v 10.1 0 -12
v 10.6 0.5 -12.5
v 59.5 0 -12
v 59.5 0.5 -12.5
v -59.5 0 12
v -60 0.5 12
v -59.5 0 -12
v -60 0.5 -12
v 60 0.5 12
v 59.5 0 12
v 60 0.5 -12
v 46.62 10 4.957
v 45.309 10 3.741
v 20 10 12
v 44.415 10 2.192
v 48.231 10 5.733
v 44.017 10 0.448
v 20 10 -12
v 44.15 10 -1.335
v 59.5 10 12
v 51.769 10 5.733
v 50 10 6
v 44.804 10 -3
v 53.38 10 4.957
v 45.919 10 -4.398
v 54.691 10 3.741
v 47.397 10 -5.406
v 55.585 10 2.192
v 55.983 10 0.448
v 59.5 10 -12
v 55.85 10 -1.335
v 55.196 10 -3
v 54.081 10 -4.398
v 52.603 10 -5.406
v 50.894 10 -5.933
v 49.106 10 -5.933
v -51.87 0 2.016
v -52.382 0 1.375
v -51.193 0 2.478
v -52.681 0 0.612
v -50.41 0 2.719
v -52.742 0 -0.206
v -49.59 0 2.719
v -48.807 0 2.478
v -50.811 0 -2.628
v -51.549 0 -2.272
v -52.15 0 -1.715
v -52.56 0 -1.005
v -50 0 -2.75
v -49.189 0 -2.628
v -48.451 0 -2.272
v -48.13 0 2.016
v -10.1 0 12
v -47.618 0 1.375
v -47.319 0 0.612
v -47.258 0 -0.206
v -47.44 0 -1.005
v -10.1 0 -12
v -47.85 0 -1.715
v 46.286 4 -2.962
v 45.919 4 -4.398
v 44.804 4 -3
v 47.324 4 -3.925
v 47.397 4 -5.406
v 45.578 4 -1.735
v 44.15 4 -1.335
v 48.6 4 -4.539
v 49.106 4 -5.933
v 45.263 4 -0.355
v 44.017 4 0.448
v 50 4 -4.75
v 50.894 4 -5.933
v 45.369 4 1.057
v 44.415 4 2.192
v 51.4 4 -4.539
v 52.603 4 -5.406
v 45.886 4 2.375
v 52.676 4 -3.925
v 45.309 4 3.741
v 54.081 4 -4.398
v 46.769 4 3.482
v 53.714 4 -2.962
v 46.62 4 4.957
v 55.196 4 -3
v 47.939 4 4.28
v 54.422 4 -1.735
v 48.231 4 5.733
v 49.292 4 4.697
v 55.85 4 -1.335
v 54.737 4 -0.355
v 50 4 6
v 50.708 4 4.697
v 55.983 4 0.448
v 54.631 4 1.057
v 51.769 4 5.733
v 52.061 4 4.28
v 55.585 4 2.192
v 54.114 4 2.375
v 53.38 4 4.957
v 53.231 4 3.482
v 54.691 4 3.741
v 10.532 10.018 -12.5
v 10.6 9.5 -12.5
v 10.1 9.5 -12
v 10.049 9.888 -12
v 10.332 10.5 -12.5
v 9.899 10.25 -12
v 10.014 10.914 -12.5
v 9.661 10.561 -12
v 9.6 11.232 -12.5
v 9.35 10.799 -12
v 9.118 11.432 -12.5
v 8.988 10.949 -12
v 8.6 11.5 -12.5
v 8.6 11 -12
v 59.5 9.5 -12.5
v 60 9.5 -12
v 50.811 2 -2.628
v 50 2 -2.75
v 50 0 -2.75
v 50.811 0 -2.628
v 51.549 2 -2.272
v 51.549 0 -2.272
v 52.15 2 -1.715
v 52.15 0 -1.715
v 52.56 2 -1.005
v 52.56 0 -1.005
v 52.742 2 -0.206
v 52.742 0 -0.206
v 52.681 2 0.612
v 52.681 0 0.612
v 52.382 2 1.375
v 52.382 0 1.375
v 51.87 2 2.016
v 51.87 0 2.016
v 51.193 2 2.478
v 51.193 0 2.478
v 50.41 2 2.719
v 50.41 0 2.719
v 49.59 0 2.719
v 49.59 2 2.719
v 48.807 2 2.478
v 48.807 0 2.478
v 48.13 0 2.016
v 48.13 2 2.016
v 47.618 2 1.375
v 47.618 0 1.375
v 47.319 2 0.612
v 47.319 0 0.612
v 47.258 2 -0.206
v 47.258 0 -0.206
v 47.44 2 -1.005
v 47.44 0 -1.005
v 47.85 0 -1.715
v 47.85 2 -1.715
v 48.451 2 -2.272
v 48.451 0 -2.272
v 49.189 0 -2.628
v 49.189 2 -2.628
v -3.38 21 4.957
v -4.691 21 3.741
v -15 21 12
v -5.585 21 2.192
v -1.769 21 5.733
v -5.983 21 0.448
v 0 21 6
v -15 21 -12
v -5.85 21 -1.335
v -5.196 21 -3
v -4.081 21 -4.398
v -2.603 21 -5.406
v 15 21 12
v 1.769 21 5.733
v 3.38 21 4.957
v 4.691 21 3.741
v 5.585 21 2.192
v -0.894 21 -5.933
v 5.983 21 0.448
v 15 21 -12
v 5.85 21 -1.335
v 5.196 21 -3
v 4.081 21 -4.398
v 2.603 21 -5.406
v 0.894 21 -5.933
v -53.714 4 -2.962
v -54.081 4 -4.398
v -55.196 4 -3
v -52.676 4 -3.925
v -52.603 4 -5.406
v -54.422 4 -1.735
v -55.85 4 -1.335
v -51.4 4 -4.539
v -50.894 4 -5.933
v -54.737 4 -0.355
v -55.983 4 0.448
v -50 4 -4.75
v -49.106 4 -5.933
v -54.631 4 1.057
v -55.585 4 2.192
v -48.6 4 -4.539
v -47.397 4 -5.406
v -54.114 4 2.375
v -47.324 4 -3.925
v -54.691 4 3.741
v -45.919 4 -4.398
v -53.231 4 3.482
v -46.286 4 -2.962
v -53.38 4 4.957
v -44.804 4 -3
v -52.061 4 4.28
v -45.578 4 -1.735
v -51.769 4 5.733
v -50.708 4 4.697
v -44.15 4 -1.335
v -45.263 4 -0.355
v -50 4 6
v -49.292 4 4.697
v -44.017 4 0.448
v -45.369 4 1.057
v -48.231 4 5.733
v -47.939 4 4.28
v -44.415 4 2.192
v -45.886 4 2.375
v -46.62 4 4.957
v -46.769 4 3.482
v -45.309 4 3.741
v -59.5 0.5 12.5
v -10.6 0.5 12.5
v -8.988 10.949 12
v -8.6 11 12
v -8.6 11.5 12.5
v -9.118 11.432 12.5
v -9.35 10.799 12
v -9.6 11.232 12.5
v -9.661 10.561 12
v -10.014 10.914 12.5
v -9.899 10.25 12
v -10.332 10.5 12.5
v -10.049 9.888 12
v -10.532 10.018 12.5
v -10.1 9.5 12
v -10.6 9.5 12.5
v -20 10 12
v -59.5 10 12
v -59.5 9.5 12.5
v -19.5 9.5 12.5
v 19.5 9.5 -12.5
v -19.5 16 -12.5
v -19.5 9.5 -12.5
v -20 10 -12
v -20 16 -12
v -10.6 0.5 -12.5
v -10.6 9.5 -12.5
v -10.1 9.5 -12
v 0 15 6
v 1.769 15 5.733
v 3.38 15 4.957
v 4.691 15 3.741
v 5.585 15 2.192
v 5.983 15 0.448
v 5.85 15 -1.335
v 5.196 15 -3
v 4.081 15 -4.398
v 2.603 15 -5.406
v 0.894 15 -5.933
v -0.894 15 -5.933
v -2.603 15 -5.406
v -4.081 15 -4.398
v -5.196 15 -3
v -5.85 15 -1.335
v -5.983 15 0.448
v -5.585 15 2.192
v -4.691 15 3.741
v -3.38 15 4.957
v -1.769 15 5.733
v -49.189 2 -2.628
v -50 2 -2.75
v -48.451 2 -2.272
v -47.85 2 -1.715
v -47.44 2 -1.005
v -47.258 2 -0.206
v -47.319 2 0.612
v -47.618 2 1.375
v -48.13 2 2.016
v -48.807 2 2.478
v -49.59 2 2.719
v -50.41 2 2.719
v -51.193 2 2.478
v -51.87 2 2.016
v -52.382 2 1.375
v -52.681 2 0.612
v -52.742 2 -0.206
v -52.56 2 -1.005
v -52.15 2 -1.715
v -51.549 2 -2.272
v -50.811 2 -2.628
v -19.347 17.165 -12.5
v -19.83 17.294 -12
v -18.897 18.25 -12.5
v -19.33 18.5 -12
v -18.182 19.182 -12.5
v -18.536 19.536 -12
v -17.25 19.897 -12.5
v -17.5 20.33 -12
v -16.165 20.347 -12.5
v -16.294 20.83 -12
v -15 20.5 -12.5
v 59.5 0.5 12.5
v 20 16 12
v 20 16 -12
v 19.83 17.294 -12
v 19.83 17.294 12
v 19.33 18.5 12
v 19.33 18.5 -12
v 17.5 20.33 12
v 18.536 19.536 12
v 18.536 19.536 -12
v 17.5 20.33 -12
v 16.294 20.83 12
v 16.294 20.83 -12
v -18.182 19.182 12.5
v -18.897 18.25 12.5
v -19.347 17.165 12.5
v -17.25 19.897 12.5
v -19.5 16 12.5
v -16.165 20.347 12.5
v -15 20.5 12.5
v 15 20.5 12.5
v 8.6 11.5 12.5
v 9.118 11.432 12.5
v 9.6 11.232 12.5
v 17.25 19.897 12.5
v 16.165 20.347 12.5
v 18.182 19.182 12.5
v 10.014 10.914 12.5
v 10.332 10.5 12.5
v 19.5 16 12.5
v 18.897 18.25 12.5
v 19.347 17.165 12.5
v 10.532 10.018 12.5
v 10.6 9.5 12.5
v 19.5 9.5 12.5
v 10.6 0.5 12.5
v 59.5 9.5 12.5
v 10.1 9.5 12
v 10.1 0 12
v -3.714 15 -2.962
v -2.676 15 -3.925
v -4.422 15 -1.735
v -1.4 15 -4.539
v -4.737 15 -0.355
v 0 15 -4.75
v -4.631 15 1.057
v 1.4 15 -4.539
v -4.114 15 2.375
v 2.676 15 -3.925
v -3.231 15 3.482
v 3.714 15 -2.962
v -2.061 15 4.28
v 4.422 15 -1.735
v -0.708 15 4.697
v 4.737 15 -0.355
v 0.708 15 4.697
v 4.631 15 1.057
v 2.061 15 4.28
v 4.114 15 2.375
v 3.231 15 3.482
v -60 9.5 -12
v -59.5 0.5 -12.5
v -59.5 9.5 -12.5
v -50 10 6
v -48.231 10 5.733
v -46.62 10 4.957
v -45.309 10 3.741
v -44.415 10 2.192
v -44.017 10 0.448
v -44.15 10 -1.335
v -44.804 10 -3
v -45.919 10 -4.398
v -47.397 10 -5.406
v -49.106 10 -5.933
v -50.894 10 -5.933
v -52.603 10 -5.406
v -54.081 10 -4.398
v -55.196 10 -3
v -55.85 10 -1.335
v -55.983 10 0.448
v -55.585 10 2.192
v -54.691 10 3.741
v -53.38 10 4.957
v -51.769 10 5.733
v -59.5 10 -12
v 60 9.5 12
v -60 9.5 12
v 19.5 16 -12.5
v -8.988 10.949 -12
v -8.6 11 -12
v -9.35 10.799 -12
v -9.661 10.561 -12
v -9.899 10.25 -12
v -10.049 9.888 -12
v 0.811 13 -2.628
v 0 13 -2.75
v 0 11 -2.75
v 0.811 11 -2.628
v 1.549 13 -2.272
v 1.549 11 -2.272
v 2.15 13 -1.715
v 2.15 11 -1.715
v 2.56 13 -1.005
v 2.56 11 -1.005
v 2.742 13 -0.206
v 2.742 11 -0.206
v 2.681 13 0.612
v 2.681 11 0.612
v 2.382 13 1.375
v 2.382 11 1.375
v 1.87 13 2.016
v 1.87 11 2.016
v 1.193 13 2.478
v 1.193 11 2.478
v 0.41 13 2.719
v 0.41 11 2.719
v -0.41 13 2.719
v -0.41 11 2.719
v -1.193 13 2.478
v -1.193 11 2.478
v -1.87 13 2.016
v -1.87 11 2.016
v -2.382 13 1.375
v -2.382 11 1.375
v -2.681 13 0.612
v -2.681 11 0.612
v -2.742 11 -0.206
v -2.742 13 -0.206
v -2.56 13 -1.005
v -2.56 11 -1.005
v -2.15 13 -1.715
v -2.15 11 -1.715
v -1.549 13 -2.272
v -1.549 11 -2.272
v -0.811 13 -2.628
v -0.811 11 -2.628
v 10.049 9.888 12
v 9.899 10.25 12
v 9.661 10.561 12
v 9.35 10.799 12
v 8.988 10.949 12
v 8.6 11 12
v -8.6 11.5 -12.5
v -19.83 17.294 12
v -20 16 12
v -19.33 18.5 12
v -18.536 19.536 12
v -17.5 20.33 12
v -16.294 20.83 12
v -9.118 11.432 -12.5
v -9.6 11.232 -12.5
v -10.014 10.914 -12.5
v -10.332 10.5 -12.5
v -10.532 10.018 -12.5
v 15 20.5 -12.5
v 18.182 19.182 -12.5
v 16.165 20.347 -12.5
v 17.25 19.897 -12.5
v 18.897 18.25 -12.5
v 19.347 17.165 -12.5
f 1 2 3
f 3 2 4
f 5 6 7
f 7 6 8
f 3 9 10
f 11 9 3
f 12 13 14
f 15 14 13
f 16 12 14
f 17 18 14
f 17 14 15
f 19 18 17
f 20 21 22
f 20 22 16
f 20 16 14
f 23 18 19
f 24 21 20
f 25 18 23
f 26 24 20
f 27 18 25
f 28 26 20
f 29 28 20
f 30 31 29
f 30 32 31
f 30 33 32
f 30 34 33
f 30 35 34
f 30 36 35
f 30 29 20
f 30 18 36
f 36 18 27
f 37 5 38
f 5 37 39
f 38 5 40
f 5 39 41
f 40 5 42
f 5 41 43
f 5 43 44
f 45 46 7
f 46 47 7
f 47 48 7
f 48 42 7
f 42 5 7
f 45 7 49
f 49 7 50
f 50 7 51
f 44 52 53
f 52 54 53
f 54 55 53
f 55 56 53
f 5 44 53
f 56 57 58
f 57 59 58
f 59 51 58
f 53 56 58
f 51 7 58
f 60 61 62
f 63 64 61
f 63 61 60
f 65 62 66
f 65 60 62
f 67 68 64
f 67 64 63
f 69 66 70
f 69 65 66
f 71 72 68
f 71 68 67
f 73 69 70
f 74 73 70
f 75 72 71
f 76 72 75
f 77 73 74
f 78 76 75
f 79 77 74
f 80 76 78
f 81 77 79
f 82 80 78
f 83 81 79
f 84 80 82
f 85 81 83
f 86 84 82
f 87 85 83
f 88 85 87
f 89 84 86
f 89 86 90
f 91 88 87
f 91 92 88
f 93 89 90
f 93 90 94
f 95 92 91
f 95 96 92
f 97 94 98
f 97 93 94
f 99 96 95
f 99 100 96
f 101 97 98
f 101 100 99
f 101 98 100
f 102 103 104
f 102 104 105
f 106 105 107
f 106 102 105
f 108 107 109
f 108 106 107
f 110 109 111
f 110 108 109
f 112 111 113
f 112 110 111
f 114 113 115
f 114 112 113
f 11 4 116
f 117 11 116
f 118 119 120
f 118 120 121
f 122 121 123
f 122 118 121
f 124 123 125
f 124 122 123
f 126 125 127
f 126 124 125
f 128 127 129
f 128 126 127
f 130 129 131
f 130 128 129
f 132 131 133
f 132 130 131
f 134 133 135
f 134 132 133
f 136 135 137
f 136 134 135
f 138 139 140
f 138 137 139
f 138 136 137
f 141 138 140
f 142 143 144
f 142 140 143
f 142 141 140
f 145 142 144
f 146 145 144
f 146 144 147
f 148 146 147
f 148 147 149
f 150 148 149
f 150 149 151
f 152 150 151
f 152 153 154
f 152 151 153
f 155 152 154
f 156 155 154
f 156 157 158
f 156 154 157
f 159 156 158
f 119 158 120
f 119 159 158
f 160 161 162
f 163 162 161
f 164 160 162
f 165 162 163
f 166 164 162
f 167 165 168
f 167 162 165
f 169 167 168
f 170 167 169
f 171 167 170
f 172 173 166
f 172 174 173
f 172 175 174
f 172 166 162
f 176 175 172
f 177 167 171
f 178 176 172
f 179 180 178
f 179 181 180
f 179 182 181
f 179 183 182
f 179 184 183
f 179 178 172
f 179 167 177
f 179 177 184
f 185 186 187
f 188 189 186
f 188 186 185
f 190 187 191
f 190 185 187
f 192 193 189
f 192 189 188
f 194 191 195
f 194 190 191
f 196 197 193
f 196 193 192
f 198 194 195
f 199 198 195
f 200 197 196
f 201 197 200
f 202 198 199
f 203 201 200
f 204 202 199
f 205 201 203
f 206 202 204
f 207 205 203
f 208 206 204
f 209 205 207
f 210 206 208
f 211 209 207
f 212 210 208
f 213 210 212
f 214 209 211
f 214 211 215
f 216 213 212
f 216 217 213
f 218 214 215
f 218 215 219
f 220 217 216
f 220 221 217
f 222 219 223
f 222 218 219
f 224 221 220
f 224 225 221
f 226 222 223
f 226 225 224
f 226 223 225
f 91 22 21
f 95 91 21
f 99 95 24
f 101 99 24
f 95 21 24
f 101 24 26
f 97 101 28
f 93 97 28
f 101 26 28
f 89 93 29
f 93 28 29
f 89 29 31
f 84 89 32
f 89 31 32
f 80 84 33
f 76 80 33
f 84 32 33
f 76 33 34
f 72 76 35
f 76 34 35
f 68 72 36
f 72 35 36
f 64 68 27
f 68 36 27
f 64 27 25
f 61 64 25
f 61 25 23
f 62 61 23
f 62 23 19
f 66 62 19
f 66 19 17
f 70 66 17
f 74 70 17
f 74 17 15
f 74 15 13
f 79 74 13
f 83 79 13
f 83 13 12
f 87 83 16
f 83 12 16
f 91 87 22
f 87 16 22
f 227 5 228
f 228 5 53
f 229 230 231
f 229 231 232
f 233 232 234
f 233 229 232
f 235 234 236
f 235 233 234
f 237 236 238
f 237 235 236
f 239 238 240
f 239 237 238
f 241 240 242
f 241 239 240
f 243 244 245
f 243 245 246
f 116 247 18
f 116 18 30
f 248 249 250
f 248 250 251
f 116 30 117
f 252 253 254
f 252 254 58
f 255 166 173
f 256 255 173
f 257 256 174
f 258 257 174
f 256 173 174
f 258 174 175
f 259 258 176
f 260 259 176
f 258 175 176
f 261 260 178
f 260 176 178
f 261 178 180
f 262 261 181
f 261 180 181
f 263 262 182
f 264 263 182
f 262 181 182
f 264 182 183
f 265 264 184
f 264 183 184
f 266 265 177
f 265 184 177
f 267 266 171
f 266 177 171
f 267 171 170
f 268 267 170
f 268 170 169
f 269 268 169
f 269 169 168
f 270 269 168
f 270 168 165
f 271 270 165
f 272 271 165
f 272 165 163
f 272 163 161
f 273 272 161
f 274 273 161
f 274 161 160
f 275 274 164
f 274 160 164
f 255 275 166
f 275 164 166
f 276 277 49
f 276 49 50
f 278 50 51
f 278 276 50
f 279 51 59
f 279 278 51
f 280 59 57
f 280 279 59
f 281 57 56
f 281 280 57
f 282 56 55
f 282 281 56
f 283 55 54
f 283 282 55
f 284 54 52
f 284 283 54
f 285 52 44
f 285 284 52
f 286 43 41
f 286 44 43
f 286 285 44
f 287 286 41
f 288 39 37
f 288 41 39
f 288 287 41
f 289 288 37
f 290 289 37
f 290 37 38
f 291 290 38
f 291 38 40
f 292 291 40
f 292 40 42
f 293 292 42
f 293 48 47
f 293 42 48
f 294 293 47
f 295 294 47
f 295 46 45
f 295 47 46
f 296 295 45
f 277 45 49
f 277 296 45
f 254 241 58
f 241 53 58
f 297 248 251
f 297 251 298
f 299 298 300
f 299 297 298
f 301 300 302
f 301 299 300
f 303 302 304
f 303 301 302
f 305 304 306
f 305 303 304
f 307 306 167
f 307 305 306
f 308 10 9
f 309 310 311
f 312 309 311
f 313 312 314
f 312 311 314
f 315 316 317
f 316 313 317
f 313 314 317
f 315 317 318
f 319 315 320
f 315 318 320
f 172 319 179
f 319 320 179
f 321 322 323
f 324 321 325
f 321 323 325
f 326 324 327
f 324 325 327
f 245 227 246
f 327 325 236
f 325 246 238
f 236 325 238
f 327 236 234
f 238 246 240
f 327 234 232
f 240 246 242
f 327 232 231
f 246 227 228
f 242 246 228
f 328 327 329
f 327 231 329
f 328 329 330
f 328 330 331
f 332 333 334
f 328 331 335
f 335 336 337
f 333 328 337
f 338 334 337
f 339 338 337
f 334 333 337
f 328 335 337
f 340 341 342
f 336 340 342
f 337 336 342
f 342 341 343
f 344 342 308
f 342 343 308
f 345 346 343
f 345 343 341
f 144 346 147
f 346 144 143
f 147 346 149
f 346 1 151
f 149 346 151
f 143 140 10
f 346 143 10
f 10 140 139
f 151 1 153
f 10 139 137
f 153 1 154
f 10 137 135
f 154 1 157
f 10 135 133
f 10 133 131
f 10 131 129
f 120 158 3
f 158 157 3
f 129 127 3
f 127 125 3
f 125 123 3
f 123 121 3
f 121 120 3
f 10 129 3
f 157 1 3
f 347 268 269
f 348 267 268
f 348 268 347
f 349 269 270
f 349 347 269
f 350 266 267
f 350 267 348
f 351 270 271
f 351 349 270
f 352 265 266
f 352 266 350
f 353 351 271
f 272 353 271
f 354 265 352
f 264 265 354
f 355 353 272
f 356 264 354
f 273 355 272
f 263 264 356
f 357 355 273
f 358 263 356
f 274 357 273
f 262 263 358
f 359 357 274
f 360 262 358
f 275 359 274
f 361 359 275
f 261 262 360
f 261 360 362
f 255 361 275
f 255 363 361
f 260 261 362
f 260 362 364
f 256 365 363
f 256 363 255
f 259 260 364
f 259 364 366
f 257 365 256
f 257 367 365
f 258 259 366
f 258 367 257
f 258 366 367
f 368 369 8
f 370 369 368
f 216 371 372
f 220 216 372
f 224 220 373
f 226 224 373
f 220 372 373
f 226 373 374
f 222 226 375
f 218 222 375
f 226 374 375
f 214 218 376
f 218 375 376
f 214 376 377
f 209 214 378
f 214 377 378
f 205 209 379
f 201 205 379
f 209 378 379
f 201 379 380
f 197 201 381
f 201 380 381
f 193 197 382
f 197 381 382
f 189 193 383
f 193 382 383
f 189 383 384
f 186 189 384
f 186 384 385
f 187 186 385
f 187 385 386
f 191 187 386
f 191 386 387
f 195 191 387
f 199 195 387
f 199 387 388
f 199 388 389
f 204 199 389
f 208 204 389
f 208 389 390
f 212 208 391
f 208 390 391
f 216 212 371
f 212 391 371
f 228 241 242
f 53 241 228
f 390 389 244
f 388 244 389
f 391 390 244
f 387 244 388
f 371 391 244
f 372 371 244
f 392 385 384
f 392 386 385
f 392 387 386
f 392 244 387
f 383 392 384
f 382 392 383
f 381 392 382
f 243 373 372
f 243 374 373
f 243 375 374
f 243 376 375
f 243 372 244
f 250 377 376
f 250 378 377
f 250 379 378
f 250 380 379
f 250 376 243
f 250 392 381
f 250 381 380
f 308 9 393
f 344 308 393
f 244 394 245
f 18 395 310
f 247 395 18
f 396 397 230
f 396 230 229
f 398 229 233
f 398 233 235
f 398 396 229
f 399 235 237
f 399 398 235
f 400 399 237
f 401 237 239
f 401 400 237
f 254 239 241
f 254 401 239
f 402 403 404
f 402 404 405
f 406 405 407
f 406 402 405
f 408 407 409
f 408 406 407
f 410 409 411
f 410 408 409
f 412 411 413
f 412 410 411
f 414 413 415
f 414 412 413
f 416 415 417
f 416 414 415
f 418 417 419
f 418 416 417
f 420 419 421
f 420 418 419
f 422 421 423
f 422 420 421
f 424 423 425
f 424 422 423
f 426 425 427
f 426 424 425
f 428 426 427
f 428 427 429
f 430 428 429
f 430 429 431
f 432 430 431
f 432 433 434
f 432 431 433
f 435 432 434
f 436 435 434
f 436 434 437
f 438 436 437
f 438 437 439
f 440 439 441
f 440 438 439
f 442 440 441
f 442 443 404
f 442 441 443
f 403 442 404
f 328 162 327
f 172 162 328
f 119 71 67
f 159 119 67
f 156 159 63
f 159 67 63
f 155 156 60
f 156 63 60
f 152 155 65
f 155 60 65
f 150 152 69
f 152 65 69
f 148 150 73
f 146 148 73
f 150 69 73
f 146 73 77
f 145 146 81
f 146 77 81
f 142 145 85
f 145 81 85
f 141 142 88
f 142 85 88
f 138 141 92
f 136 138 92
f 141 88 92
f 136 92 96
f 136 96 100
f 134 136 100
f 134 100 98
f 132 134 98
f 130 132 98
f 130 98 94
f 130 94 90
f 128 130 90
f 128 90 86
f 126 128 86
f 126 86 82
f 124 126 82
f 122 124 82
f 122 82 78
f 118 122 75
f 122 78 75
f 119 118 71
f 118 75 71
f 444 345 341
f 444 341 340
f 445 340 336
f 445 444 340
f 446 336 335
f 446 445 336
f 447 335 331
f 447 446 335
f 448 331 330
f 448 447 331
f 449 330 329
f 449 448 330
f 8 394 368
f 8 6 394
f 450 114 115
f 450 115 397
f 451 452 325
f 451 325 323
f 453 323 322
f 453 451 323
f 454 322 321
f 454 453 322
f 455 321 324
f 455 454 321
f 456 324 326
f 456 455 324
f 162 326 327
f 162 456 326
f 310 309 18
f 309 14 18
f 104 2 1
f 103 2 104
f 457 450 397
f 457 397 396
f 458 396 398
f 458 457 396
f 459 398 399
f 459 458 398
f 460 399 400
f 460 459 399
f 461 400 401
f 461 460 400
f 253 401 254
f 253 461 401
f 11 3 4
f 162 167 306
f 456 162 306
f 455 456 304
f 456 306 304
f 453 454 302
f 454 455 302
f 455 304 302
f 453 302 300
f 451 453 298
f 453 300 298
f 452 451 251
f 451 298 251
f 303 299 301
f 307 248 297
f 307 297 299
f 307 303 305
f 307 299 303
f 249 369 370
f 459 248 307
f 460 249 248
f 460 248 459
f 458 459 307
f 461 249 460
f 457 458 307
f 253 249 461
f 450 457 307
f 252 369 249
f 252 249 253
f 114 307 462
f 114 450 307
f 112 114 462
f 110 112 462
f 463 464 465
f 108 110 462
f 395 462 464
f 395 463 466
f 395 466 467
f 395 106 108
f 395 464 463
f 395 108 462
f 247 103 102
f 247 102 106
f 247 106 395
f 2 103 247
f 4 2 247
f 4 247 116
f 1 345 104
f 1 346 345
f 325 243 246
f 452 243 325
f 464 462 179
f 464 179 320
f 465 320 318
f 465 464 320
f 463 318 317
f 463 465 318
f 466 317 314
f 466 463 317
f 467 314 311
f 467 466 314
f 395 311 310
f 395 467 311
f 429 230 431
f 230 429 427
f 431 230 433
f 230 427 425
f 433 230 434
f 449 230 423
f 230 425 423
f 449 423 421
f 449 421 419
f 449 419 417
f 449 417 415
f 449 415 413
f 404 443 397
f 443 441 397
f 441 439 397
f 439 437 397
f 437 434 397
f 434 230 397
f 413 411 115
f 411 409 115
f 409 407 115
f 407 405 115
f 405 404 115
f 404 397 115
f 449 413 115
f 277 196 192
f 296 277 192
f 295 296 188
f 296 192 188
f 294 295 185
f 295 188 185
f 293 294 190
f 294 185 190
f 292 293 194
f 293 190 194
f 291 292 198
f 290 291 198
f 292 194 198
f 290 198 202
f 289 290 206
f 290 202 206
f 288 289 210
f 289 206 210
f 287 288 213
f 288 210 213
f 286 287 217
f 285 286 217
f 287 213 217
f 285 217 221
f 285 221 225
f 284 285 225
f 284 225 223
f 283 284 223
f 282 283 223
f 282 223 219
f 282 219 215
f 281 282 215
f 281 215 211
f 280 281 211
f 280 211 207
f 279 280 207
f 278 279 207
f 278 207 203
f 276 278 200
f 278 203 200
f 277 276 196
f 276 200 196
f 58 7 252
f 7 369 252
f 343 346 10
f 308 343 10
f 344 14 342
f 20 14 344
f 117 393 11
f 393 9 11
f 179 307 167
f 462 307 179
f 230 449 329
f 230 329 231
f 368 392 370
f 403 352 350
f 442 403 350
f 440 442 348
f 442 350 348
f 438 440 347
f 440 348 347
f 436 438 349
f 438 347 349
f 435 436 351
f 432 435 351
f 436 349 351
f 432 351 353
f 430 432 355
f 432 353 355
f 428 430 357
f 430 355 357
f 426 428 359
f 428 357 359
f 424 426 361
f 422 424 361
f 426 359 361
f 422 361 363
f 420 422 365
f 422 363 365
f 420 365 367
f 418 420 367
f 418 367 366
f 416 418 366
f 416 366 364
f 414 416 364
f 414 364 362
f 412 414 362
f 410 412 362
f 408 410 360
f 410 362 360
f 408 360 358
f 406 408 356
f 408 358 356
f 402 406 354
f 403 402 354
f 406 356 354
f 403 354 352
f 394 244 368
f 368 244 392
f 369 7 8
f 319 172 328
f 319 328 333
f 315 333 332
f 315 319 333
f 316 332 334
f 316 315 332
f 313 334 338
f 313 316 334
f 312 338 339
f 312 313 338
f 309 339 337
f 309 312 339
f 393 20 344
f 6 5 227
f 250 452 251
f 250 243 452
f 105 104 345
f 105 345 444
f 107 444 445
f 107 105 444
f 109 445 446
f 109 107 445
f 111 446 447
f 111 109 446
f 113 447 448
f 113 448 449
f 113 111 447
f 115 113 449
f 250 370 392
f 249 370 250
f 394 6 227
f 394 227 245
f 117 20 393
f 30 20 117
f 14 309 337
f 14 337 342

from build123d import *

# Parameters (mm, degrees)
SKETCH1_W               = 120
SKETCH1_H               = 25
BOSS_EXTRUDE1_DEPTH     = 10
SKETCH2_W               = 40
SKETCH2_H               = 25
BOSS_EXTRUDE2_DEPTH     = 11
SKETCH3_W               = 20.2
SKETCH3_H               = 25
CUT_EXTRUDE1_DEPTH      = 11
CUT_EXTRUDE2_DEPTH      = 63.267567802
CUT_EXTRUDE2_DEPTH_BACK = 63.267567802
SKETCH4_R               = 2.75
FILLET1_R               = 5
FILLET2_R               = 1.5
CHAMFER1_SIZE           = 0.5
SKETCH5_R               = 6
CUT_EXTRUDE3_DEPTH      = 6
CHAMFER2_SIZE           = 2
SKETCH6_R               = 6
CUT_EXTRUDE4_DEPTH      = 6
CHAMFER3_SIZE           = 2


with BuildPart() as part:
    # Sketch1 → Boss-Extrude1 (new body)
    with BuildSketch(Plane(origin=(0, 0, 0), x_dir=(1, 0, 0), z_dir=(0, 1, 0))):
        Rectangle(SKETCH1_W, SKETCH1_H)
    extrude(amount=BOSS_EXTRUDE1_DEPTH)

    # Sketch2 → Boss-Extrude2 (add)
    with BuildSketch(Plane(origin=(0, 10, 0), x_dir=(1, 0, 0), z_dir=(0, 1, 0))):
        Rectangle(SKETCH2_W, SKETCH2_H)
    extrude(amount=BOSS_EXTRUDE2_DEPTH)

    # Sketch3 → Cut-Extrude1 (cut)
    with BuildSketch(Plane(origin=(0, 0, 0), x_dir=(1, 0, 0), z_dir=(0, 1, 0))):
        Rectangle(SKETCH3_W, SKETCH3_H)
    extrude(amount=CUT_EXTRUDE1_DEPTH, mode=Mode.SUBTRACT)

    # Sketch4 → Cut-Extrude2 (cut, two sides: drawn at the far end of the back side and taken through both)
    with BuildSketch(Plane.XZ.offset(-11).offset(-CUT_EXTRUDE2_DEPTH_BACK)):
        with Locations(Location((0, 0, 0), (0, 0, 270))):
            Circle(SKETCH4_R)
        with Locations(Location((-50, 0, 0), (0, 0, 270))):
            Circle(SKETCH4_R)
        with Locations(Location((50, 0, 0), (0, 0, 270))):
            Circle(SKETCH4_R)
    extrude(amount=CUT_EXTRUDE2_DEPTH + CUT_EXTRUDE2_DEPTH_BACK, mode=Mode.SUBTRACT)

    # Fillet1
    fillet1_edges = [part.edges().sort_by_distance(p)[0] for p in [
        (-20, 21, 0),
        (20, 21, 0),
    ]]
    fillet(fillet1_edges, radius=FILLET1_R)

    # Fillet2
    fillet2_edges = [part.edges().sort_by_distance(p)[0] for p in [
        (-10.1, 11, 0),
        (10.1, 11, 0),
    ]]
    fillet(fillet2_edges, radius=FILLET2_R)

    # Chamfer1
    chamfer1_edges = [part.edges().sort_by_distance(p)[0] for p in [
        (60, 10, 0),
        (40, 10, 12.5),
        (-40, 10, -12.5),
        (40, 10, -12.5),
        (-35.05, 0, -12.5),
        (35.05, 0, 12.5),
        (-60, 10, 0),
        (35.05, 0, -12.5),
        (60, 0, 0),
        (-35.05, 0, 12.5),
        (0, 21, 12.5),
        (0, 21, -12.5),
        (20, 13, 12.5),
        (-20, 13, 12.5),
        (18.535533906, 19.535533906, 12.5),
        (-60, 0, 0),
        (-18.535533906, 19.535533906, 12.5),
        (-20, 13, -12.5),
        (20, 13, -12.5),
        (18.535533906, 19.535533906, -12.5),
        (-18.535533906, 19.535533906, -12.5),
        (10.1, 4.75, 12.5),
        (10.1, 4.75, -12.5),
        (0, 11, -12.5),
        (0, 11, 12.5),
        (-10.1, 4.75, -12.5),
        (-10.1, 4.75, 12.5),
        (9.660660172, 10.560660172, -12.5),
        (9.660660172, 10.560660172, 12.5),
        (-9.660660172, 10.560660172, 12.5),
        (-9.660660172, 10.560660172, -12.5),
        (-60, 5, -12.5),
        (60, 5, -12.5),
        (60, 5, 12.5),
        (-60, 5, 12.5),
        (-40, 10, 12.5),
    ]]
    chamfer(chamfer1_edges, length=CHAMFER1_SIZE)

    # Sketch5 → Cut-Extrude3 (cut)
    with BuildSketch(Plane(origin=(0, 10, 0), x_dir=(1, 0, 0), z_dir=(0, 1, 0))):
        with Locations(Location((-50, 0, 0), (0, 0, 270))):
            Circle(SKETCH5_R)
        with Locations(Location((50, 0, 0), (0, 0, 270))):
            Circle(SKETCH5_R)
    extrude(amount=-CUT_EXTRUDE3_DEPTH, mode=Mode.SUBTRACT)

    # Chamfer2
    chamfer2_edges = [part.edges().sort_by_distance(p)[0] for p in [
        (-50, 4, 2.75),
        (50, 4, 2.75),
    ]]
    chamfer(chamfer2_edges, length=CHAMFER2_SIZE)

    # Sketch6 → Cut-Extrude4 (cut)
    with BuildSketch(Plane(origin=(0, 21, 0), x_dir=(1, 0, 0), z_dir=(0, 1, 0))):
        with Locations(Location((0, 0, 0), (0, 0, 270))):
            Circle(SKETCH6_R)
    extrude(amount=-CUT_EXTRUDE4_DEPTH, mode=Mode.SUBTRACT)

    # Chamfer3
    chamfer3_edges = [part.edges().sort_by_distance(p)[0] for p in [
        (0, 15, 2.75),
    ]]
    chamfer(chamfer3_edges, length=CHAMFER3_SIZE)


solid = part.part
